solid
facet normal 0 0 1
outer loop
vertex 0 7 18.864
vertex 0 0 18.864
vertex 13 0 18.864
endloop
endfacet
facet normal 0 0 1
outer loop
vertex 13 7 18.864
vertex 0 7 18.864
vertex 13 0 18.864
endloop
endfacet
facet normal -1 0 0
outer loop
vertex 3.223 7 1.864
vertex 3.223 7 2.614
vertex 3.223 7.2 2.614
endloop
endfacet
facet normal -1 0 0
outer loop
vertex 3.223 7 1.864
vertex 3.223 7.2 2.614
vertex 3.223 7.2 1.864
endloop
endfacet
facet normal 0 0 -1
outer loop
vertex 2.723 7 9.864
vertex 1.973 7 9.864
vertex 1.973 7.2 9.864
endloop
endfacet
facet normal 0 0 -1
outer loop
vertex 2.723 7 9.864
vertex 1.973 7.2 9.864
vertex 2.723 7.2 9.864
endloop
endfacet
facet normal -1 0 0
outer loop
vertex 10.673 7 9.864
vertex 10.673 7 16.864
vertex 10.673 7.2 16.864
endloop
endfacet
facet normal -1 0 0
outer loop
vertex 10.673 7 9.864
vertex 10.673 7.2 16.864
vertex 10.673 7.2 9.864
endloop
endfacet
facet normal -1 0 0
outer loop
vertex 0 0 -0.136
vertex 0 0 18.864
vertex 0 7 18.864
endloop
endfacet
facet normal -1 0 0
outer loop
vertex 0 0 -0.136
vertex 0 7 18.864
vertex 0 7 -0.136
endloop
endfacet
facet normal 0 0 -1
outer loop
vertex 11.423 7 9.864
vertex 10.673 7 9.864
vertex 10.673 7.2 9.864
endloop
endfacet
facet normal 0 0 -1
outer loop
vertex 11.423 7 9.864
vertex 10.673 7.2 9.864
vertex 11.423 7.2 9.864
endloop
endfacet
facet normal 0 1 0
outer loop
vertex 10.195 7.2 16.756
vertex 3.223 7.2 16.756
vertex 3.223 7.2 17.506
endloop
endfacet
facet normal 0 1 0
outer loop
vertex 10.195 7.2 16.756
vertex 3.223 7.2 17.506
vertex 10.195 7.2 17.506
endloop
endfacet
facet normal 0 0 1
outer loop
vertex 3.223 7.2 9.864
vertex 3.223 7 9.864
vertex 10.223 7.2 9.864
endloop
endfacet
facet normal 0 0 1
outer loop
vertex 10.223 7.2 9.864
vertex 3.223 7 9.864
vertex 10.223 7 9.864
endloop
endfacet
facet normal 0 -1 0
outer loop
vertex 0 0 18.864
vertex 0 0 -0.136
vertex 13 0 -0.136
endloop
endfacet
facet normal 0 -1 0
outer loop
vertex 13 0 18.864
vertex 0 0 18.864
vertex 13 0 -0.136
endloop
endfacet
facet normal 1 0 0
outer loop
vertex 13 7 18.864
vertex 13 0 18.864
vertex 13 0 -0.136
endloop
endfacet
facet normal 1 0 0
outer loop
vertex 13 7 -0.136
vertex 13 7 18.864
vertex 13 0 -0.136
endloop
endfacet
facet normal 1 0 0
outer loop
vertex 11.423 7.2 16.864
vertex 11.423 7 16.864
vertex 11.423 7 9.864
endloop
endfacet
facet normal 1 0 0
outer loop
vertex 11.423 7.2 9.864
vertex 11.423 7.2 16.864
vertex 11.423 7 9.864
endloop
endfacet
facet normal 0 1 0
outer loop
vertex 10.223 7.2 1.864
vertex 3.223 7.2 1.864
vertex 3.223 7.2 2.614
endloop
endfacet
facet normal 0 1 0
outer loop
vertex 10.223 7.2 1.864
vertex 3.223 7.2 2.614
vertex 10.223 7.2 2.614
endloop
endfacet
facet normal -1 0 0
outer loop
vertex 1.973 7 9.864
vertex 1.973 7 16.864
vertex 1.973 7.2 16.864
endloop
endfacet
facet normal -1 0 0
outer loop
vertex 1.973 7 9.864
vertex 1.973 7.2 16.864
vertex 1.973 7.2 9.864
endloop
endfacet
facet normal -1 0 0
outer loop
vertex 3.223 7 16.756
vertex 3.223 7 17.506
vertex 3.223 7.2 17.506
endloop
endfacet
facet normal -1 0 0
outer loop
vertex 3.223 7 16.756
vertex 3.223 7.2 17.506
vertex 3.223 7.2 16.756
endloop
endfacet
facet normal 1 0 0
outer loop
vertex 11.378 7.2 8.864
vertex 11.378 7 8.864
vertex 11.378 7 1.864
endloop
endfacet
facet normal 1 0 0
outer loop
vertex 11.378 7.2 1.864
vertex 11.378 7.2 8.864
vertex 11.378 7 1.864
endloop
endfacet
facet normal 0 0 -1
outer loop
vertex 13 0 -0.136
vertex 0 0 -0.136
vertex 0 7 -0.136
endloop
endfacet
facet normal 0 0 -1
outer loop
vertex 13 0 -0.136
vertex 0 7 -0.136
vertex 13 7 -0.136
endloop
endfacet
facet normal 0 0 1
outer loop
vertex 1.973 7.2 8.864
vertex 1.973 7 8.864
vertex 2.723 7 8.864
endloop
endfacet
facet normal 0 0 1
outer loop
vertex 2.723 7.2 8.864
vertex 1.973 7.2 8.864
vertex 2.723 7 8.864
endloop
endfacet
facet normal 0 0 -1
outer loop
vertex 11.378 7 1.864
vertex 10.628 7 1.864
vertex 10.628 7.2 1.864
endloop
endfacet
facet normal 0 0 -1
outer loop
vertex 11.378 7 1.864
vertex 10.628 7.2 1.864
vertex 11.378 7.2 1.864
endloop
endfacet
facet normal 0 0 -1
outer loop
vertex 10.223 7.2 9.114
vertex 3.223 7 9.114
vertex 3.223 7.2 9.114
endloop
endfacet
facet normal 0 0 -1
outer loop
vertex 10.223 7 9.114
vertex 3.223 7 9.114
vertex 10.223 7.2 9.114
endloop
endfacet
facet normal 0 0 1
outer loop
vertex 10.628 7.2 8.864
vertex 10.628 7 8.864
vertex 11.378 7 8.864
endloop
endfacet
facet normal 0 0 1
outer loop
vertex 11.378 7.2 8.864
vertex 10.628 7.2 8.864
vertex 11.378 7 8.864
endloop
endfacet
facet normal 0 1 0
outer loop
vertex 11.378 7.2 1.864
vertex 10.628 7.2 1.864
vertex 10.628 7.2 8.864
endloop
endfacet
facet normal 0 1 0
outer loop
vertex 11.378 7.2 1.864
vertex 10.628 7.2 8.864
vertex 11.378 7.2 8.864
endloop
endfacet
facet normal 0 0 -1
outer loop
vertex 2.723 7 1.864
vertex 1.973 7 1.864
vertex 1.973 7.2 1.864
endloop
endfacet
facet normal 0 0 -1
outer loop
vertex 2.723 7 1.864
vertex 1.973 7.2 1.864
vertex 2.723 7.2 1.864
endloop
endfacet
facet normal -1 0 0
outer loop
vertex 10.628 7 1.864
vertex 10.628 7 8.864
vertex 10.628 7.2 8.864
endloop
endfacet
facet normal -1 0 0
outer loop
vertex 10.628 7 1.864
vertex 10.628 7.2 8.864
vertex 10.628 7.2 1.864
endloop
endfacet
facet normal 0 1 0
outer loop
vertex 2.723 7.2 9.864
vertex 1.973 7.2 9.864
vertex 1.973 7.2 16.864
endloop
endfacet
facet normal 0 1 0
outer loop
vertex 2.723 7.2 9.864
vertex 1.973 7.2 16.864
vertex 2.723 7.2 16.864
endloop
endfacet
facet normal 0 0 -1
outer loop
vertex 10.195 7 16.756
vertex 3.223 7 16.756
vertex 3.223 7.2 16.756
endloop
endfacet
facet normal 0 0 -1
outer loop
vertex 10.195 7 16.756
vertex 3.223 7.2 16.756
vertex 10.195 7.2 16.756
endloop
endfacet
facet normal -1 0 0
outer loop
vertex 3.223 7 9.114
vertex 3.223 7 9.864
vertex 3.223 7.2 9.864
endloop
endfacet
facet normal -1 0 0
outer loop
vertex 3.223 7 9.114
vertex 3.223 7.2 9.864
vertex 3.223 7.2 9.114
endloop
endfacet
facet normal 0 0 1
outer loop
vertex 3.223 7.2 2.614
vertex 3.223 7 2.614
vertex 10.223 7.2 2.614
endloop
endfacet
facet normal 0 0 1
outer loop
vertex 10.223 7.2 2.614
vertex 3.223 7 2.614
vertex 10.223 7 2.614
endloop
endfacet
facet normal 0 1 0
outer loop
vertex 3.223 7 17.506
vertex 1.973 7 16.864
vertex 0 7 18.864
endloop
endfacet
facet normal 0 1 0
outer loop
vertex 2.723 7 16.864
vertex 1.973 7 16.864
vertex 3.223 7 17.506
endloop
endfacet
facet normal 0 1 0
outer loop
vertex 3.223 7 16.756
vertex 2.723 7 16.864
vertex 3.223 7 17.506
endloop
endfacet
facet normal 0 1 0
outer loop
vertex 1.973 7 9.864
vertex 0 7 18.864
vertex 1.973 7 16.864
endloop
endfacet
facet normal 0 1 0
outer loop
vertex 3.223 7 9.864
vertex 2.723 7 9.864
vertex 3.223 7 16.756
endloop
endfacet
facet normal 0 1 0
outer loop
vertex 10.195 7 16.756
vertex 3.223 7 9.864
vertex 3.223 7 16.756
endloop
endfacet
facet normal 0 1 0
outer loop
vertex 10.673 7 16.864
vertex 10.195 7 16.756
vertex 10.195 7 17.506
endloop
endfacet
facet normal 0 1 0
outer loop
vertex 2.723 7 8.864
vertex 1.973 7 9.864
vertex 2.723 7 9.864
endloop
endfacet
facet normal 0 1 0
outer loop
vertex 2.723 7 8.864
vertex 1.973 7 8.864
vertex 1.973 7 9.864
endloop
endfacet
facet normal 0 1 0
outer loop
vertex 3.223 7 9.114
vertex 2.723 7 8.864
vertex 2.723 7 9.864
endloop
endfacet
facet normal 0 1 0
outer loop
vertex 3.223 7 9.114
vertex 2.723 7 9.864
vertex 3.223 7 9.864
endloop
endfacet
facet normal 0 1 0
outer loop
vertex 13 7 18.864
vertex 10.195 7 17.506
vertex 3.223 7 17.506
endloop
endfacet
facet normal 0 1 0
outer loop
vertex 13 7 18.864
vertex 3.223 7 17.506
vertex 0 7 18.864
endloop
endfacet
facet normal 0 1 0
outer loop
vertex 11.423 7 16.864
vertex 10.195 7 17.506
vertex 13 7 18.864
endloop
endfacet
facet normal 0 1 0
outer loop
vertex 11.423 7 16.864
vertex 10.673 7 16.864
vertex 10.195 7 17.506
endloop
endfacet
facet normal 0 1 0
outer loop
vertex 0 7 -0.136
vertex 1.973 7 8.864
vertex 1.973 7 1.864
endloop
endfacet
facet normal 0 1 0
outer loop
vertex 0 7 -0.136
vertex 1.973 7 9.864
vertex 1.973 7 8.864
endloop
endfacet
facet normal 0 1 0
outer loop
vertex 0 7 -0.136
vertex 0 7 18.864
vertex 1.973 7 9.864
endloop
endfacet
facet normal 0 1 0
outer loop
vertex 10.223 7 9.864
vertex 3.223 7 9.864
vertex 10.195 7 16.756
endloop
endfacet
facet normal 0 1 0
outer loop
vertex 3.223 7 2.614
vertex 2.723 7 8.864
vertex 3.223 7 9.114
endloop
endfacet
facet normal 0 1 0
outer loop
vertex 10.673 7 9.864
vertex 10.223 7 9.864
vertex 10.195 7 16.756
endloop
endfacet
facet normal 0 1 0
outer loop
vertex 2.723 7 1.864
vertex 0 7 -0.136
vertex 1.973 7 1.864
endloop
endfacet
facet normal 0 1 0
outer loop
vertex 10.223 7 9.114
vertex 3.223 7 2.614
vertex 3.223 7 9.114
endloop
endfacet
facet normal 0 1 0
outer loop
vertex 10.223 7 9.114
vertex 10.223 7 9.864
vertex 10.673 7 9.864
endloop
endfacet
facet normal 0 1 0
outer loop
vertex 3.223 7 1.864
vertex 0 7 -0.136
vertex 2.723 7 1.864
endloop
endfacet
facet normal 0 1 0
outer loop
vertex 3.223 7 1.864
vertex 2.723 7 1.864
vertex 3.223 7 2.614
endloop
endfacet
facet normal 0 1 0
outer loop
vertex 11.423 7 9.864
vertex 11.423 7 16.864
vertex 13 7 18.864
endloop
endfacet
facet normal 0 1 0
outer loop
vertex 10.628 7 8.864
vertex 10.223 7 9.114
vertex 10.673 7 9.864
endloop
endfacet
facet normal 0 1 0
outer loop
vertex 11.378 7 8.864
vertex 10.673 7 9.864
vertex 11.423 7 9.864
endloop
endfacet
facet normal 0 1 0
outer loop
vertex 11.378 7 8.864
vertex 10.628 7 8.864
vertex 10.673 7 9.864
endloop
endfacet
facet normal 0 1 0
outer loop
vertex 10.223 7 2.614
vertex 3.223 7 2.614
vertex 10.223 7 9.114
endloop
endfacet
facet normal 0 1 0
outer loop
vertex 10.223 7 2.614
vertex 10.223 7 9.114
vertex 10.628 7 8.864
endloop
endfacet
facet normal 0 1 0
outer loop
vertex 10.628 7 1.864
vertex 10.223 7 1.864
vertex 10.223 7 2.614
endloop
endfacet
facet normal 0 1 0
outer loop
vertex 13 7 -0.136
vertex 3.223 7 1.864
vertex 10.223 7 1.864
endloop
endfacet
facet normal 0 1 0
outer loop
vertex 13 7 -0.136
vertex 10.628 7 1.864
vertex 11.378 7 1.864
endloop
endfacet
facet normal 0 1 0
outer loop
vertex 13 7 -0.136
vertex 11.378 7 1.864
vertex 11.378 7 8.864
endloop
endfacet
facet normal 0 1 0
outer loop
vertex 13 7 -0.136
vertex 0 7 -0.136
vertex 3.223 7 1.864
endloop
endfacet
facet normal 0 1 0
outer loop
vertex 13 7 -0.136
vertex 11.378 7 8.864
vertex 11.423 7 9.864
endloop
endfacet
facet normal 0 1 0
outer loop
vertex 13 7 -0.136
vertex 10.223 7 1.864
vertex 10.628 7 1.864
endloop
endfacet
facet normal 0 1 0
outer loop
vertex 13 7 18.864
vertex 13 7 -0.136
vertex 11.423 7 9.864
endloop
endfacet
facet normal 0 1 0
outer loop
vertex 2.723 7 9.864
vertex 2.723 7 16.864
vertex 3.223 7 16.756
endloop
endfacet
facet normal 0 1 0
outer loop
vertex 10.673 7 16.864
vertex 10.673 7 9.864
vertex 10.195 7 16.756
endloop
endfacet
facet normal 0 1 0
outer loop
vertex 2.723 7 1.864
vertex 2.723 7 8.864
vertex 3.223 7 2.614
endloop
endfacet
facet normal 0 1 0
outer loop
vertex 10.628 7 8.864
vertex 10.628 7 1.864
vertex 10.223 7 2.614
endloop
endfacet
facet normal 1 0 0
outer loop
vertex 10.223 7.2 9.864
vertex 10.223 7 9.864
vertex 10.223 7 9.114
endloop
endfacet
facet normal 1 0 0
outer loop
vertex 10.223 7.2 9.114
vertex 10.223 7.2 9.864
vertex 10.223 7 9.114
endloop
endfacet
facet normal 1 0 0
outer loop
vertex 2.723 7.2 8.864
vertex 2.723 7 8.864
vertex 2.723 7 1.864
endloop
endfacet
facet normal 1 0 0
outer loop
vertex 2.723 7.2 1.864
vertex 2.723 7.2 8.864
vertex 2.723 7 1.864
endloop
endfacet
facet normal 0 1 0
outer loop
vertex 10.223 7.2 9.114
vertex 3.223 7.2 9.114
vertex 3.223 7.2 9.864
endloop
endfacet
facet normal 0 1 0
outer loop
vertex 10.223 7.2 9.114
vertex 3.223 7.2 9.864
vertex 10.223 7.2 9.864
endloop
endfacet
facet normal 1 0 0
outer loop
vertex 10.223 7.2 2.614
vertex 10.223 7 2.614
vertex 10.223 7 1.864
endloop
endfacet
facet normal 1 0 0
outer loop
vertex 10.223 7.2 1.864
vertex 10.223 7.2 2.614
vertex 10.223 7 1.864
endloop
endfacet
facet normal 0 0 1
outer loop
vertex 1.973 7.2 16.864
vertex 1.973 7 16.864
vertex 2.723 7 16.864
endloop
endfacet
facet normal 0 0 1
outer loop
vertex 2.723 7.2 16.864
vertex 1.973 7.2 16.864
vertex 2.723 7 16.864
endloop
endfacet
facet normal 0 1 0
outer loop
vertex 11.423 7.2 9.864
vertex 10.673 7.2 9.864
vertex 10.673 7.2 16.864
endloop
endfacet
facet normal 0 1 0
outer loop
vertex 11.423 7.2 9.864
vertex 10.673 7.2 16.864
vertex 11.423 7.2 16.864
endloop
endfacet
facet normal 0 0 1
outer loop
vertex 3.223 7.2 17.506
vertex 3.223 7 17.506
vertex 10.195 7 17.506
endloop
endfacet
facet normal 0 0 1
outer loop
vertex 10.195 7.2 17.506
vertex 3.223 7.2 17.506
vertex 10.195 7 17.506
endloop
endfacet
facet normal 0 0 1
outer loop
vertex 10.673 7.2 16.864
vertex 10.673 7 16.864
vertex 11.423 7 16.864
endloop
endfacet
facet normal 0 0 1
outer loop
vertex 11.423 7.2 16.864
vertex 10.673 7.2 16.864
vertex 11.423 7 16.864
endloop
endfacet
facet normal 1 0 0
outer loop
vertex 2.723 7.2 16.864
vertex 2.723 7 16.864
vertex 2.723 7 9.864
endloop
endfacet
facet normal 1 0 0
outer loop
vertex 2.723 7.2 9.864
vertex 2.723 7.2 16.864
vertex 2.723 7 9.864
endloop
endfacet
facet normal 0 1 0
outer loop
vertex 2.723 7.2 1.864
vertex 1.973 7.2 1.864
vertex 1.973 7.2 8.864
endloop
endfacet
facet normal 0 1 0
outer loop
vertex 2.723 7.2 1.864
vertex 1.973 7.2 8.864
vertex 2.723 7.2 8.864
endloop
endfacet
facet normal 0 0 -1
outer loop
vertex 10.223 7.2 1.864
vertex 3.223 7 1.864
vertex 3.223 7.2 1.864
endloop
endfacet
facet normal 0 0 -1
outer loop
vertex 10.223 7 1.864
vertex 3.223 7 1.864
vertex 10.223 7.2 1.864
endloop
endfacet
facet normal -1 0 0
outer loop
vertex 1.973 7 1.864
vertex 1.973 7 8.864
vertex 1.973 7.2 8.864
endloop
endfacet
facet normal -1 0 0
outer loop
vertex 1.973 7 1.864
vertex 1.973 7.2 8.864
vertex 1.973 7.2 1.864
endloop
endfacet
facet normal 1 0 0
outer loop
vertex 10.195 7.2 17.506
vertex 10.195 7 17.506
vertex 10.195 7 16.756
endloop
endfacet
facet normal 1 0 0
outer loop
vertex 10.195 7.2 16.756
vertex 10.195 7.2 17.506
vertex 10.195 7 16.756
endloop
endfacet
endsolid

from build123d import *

# Parameters (mm, degrees)
SKETCH1_W           = 13
SKETCH1_H           = 19
BOSS_EXTRUDE1_DEPTH = 7
SKETCH2_W           = 7
SKETCH2_H           = 0.75
SKETCH2_W_2         = 0.75
SKETCH2_H_2         = 7
SKETCH2_W_3         = 6.972272669
BOSS_EXTRUDE2_DEPTH = 0.2


with BuildPart() as part:
    # Sketch1 → Boss-Extrude1 (new body)
    with BuildSketch(Plane(origin=(0, 0, 0), x_dir=(1, 0, 0), z_dir=(0, 1, 0))):
        with Locations((6.5, -9.363530646)):
            Rectangle(SKETCH1_W, SKETCH1_H)
    extrude(amount=BOSS_EXTRUDE1_DEPTH)

    # Sketch2 → Boss-Extrude2 (add)
    with BuildSketch(Plane(origin=(0, 7, 0), x_dir=(1, 0, 0), z_dir=(0, 1, 0))):
        with Locations((6.722702143, -2.238530646)):
            Rectangle(SKETCH2_W, SKETCH2_H)
        with Locations((2.347702143, -5.363530646)):
            Rectangle(SKETCH2_W_2, SKETCH2_H_2)
        with Locations((11.003251179, -5.363530646)):
            Rectangle(SKETCH2_W_2, SKETCH2_H_2)
        with Locations((6.722702143, -9.488530646)):
            Rectangle(SKETCH2_W, SKETCH2_H)
        with Locations((2.347702143, -13.363530646)):
            Rectangle(SKETCH2_W_2, SKETCH2_H_2)
        with Locations((6.708838478, -17.130647723)):
            Rectangle(SKETCH2_W_3, SKETCH2_H)
        with Locations((11.047702143, -13.363530646)):
            Rectangle(SKETCH2_W_2, SKETCH2_H_2)
    extrude(amount=BOSS_EXTRUDE2_DEPTH)


solid = part.part
